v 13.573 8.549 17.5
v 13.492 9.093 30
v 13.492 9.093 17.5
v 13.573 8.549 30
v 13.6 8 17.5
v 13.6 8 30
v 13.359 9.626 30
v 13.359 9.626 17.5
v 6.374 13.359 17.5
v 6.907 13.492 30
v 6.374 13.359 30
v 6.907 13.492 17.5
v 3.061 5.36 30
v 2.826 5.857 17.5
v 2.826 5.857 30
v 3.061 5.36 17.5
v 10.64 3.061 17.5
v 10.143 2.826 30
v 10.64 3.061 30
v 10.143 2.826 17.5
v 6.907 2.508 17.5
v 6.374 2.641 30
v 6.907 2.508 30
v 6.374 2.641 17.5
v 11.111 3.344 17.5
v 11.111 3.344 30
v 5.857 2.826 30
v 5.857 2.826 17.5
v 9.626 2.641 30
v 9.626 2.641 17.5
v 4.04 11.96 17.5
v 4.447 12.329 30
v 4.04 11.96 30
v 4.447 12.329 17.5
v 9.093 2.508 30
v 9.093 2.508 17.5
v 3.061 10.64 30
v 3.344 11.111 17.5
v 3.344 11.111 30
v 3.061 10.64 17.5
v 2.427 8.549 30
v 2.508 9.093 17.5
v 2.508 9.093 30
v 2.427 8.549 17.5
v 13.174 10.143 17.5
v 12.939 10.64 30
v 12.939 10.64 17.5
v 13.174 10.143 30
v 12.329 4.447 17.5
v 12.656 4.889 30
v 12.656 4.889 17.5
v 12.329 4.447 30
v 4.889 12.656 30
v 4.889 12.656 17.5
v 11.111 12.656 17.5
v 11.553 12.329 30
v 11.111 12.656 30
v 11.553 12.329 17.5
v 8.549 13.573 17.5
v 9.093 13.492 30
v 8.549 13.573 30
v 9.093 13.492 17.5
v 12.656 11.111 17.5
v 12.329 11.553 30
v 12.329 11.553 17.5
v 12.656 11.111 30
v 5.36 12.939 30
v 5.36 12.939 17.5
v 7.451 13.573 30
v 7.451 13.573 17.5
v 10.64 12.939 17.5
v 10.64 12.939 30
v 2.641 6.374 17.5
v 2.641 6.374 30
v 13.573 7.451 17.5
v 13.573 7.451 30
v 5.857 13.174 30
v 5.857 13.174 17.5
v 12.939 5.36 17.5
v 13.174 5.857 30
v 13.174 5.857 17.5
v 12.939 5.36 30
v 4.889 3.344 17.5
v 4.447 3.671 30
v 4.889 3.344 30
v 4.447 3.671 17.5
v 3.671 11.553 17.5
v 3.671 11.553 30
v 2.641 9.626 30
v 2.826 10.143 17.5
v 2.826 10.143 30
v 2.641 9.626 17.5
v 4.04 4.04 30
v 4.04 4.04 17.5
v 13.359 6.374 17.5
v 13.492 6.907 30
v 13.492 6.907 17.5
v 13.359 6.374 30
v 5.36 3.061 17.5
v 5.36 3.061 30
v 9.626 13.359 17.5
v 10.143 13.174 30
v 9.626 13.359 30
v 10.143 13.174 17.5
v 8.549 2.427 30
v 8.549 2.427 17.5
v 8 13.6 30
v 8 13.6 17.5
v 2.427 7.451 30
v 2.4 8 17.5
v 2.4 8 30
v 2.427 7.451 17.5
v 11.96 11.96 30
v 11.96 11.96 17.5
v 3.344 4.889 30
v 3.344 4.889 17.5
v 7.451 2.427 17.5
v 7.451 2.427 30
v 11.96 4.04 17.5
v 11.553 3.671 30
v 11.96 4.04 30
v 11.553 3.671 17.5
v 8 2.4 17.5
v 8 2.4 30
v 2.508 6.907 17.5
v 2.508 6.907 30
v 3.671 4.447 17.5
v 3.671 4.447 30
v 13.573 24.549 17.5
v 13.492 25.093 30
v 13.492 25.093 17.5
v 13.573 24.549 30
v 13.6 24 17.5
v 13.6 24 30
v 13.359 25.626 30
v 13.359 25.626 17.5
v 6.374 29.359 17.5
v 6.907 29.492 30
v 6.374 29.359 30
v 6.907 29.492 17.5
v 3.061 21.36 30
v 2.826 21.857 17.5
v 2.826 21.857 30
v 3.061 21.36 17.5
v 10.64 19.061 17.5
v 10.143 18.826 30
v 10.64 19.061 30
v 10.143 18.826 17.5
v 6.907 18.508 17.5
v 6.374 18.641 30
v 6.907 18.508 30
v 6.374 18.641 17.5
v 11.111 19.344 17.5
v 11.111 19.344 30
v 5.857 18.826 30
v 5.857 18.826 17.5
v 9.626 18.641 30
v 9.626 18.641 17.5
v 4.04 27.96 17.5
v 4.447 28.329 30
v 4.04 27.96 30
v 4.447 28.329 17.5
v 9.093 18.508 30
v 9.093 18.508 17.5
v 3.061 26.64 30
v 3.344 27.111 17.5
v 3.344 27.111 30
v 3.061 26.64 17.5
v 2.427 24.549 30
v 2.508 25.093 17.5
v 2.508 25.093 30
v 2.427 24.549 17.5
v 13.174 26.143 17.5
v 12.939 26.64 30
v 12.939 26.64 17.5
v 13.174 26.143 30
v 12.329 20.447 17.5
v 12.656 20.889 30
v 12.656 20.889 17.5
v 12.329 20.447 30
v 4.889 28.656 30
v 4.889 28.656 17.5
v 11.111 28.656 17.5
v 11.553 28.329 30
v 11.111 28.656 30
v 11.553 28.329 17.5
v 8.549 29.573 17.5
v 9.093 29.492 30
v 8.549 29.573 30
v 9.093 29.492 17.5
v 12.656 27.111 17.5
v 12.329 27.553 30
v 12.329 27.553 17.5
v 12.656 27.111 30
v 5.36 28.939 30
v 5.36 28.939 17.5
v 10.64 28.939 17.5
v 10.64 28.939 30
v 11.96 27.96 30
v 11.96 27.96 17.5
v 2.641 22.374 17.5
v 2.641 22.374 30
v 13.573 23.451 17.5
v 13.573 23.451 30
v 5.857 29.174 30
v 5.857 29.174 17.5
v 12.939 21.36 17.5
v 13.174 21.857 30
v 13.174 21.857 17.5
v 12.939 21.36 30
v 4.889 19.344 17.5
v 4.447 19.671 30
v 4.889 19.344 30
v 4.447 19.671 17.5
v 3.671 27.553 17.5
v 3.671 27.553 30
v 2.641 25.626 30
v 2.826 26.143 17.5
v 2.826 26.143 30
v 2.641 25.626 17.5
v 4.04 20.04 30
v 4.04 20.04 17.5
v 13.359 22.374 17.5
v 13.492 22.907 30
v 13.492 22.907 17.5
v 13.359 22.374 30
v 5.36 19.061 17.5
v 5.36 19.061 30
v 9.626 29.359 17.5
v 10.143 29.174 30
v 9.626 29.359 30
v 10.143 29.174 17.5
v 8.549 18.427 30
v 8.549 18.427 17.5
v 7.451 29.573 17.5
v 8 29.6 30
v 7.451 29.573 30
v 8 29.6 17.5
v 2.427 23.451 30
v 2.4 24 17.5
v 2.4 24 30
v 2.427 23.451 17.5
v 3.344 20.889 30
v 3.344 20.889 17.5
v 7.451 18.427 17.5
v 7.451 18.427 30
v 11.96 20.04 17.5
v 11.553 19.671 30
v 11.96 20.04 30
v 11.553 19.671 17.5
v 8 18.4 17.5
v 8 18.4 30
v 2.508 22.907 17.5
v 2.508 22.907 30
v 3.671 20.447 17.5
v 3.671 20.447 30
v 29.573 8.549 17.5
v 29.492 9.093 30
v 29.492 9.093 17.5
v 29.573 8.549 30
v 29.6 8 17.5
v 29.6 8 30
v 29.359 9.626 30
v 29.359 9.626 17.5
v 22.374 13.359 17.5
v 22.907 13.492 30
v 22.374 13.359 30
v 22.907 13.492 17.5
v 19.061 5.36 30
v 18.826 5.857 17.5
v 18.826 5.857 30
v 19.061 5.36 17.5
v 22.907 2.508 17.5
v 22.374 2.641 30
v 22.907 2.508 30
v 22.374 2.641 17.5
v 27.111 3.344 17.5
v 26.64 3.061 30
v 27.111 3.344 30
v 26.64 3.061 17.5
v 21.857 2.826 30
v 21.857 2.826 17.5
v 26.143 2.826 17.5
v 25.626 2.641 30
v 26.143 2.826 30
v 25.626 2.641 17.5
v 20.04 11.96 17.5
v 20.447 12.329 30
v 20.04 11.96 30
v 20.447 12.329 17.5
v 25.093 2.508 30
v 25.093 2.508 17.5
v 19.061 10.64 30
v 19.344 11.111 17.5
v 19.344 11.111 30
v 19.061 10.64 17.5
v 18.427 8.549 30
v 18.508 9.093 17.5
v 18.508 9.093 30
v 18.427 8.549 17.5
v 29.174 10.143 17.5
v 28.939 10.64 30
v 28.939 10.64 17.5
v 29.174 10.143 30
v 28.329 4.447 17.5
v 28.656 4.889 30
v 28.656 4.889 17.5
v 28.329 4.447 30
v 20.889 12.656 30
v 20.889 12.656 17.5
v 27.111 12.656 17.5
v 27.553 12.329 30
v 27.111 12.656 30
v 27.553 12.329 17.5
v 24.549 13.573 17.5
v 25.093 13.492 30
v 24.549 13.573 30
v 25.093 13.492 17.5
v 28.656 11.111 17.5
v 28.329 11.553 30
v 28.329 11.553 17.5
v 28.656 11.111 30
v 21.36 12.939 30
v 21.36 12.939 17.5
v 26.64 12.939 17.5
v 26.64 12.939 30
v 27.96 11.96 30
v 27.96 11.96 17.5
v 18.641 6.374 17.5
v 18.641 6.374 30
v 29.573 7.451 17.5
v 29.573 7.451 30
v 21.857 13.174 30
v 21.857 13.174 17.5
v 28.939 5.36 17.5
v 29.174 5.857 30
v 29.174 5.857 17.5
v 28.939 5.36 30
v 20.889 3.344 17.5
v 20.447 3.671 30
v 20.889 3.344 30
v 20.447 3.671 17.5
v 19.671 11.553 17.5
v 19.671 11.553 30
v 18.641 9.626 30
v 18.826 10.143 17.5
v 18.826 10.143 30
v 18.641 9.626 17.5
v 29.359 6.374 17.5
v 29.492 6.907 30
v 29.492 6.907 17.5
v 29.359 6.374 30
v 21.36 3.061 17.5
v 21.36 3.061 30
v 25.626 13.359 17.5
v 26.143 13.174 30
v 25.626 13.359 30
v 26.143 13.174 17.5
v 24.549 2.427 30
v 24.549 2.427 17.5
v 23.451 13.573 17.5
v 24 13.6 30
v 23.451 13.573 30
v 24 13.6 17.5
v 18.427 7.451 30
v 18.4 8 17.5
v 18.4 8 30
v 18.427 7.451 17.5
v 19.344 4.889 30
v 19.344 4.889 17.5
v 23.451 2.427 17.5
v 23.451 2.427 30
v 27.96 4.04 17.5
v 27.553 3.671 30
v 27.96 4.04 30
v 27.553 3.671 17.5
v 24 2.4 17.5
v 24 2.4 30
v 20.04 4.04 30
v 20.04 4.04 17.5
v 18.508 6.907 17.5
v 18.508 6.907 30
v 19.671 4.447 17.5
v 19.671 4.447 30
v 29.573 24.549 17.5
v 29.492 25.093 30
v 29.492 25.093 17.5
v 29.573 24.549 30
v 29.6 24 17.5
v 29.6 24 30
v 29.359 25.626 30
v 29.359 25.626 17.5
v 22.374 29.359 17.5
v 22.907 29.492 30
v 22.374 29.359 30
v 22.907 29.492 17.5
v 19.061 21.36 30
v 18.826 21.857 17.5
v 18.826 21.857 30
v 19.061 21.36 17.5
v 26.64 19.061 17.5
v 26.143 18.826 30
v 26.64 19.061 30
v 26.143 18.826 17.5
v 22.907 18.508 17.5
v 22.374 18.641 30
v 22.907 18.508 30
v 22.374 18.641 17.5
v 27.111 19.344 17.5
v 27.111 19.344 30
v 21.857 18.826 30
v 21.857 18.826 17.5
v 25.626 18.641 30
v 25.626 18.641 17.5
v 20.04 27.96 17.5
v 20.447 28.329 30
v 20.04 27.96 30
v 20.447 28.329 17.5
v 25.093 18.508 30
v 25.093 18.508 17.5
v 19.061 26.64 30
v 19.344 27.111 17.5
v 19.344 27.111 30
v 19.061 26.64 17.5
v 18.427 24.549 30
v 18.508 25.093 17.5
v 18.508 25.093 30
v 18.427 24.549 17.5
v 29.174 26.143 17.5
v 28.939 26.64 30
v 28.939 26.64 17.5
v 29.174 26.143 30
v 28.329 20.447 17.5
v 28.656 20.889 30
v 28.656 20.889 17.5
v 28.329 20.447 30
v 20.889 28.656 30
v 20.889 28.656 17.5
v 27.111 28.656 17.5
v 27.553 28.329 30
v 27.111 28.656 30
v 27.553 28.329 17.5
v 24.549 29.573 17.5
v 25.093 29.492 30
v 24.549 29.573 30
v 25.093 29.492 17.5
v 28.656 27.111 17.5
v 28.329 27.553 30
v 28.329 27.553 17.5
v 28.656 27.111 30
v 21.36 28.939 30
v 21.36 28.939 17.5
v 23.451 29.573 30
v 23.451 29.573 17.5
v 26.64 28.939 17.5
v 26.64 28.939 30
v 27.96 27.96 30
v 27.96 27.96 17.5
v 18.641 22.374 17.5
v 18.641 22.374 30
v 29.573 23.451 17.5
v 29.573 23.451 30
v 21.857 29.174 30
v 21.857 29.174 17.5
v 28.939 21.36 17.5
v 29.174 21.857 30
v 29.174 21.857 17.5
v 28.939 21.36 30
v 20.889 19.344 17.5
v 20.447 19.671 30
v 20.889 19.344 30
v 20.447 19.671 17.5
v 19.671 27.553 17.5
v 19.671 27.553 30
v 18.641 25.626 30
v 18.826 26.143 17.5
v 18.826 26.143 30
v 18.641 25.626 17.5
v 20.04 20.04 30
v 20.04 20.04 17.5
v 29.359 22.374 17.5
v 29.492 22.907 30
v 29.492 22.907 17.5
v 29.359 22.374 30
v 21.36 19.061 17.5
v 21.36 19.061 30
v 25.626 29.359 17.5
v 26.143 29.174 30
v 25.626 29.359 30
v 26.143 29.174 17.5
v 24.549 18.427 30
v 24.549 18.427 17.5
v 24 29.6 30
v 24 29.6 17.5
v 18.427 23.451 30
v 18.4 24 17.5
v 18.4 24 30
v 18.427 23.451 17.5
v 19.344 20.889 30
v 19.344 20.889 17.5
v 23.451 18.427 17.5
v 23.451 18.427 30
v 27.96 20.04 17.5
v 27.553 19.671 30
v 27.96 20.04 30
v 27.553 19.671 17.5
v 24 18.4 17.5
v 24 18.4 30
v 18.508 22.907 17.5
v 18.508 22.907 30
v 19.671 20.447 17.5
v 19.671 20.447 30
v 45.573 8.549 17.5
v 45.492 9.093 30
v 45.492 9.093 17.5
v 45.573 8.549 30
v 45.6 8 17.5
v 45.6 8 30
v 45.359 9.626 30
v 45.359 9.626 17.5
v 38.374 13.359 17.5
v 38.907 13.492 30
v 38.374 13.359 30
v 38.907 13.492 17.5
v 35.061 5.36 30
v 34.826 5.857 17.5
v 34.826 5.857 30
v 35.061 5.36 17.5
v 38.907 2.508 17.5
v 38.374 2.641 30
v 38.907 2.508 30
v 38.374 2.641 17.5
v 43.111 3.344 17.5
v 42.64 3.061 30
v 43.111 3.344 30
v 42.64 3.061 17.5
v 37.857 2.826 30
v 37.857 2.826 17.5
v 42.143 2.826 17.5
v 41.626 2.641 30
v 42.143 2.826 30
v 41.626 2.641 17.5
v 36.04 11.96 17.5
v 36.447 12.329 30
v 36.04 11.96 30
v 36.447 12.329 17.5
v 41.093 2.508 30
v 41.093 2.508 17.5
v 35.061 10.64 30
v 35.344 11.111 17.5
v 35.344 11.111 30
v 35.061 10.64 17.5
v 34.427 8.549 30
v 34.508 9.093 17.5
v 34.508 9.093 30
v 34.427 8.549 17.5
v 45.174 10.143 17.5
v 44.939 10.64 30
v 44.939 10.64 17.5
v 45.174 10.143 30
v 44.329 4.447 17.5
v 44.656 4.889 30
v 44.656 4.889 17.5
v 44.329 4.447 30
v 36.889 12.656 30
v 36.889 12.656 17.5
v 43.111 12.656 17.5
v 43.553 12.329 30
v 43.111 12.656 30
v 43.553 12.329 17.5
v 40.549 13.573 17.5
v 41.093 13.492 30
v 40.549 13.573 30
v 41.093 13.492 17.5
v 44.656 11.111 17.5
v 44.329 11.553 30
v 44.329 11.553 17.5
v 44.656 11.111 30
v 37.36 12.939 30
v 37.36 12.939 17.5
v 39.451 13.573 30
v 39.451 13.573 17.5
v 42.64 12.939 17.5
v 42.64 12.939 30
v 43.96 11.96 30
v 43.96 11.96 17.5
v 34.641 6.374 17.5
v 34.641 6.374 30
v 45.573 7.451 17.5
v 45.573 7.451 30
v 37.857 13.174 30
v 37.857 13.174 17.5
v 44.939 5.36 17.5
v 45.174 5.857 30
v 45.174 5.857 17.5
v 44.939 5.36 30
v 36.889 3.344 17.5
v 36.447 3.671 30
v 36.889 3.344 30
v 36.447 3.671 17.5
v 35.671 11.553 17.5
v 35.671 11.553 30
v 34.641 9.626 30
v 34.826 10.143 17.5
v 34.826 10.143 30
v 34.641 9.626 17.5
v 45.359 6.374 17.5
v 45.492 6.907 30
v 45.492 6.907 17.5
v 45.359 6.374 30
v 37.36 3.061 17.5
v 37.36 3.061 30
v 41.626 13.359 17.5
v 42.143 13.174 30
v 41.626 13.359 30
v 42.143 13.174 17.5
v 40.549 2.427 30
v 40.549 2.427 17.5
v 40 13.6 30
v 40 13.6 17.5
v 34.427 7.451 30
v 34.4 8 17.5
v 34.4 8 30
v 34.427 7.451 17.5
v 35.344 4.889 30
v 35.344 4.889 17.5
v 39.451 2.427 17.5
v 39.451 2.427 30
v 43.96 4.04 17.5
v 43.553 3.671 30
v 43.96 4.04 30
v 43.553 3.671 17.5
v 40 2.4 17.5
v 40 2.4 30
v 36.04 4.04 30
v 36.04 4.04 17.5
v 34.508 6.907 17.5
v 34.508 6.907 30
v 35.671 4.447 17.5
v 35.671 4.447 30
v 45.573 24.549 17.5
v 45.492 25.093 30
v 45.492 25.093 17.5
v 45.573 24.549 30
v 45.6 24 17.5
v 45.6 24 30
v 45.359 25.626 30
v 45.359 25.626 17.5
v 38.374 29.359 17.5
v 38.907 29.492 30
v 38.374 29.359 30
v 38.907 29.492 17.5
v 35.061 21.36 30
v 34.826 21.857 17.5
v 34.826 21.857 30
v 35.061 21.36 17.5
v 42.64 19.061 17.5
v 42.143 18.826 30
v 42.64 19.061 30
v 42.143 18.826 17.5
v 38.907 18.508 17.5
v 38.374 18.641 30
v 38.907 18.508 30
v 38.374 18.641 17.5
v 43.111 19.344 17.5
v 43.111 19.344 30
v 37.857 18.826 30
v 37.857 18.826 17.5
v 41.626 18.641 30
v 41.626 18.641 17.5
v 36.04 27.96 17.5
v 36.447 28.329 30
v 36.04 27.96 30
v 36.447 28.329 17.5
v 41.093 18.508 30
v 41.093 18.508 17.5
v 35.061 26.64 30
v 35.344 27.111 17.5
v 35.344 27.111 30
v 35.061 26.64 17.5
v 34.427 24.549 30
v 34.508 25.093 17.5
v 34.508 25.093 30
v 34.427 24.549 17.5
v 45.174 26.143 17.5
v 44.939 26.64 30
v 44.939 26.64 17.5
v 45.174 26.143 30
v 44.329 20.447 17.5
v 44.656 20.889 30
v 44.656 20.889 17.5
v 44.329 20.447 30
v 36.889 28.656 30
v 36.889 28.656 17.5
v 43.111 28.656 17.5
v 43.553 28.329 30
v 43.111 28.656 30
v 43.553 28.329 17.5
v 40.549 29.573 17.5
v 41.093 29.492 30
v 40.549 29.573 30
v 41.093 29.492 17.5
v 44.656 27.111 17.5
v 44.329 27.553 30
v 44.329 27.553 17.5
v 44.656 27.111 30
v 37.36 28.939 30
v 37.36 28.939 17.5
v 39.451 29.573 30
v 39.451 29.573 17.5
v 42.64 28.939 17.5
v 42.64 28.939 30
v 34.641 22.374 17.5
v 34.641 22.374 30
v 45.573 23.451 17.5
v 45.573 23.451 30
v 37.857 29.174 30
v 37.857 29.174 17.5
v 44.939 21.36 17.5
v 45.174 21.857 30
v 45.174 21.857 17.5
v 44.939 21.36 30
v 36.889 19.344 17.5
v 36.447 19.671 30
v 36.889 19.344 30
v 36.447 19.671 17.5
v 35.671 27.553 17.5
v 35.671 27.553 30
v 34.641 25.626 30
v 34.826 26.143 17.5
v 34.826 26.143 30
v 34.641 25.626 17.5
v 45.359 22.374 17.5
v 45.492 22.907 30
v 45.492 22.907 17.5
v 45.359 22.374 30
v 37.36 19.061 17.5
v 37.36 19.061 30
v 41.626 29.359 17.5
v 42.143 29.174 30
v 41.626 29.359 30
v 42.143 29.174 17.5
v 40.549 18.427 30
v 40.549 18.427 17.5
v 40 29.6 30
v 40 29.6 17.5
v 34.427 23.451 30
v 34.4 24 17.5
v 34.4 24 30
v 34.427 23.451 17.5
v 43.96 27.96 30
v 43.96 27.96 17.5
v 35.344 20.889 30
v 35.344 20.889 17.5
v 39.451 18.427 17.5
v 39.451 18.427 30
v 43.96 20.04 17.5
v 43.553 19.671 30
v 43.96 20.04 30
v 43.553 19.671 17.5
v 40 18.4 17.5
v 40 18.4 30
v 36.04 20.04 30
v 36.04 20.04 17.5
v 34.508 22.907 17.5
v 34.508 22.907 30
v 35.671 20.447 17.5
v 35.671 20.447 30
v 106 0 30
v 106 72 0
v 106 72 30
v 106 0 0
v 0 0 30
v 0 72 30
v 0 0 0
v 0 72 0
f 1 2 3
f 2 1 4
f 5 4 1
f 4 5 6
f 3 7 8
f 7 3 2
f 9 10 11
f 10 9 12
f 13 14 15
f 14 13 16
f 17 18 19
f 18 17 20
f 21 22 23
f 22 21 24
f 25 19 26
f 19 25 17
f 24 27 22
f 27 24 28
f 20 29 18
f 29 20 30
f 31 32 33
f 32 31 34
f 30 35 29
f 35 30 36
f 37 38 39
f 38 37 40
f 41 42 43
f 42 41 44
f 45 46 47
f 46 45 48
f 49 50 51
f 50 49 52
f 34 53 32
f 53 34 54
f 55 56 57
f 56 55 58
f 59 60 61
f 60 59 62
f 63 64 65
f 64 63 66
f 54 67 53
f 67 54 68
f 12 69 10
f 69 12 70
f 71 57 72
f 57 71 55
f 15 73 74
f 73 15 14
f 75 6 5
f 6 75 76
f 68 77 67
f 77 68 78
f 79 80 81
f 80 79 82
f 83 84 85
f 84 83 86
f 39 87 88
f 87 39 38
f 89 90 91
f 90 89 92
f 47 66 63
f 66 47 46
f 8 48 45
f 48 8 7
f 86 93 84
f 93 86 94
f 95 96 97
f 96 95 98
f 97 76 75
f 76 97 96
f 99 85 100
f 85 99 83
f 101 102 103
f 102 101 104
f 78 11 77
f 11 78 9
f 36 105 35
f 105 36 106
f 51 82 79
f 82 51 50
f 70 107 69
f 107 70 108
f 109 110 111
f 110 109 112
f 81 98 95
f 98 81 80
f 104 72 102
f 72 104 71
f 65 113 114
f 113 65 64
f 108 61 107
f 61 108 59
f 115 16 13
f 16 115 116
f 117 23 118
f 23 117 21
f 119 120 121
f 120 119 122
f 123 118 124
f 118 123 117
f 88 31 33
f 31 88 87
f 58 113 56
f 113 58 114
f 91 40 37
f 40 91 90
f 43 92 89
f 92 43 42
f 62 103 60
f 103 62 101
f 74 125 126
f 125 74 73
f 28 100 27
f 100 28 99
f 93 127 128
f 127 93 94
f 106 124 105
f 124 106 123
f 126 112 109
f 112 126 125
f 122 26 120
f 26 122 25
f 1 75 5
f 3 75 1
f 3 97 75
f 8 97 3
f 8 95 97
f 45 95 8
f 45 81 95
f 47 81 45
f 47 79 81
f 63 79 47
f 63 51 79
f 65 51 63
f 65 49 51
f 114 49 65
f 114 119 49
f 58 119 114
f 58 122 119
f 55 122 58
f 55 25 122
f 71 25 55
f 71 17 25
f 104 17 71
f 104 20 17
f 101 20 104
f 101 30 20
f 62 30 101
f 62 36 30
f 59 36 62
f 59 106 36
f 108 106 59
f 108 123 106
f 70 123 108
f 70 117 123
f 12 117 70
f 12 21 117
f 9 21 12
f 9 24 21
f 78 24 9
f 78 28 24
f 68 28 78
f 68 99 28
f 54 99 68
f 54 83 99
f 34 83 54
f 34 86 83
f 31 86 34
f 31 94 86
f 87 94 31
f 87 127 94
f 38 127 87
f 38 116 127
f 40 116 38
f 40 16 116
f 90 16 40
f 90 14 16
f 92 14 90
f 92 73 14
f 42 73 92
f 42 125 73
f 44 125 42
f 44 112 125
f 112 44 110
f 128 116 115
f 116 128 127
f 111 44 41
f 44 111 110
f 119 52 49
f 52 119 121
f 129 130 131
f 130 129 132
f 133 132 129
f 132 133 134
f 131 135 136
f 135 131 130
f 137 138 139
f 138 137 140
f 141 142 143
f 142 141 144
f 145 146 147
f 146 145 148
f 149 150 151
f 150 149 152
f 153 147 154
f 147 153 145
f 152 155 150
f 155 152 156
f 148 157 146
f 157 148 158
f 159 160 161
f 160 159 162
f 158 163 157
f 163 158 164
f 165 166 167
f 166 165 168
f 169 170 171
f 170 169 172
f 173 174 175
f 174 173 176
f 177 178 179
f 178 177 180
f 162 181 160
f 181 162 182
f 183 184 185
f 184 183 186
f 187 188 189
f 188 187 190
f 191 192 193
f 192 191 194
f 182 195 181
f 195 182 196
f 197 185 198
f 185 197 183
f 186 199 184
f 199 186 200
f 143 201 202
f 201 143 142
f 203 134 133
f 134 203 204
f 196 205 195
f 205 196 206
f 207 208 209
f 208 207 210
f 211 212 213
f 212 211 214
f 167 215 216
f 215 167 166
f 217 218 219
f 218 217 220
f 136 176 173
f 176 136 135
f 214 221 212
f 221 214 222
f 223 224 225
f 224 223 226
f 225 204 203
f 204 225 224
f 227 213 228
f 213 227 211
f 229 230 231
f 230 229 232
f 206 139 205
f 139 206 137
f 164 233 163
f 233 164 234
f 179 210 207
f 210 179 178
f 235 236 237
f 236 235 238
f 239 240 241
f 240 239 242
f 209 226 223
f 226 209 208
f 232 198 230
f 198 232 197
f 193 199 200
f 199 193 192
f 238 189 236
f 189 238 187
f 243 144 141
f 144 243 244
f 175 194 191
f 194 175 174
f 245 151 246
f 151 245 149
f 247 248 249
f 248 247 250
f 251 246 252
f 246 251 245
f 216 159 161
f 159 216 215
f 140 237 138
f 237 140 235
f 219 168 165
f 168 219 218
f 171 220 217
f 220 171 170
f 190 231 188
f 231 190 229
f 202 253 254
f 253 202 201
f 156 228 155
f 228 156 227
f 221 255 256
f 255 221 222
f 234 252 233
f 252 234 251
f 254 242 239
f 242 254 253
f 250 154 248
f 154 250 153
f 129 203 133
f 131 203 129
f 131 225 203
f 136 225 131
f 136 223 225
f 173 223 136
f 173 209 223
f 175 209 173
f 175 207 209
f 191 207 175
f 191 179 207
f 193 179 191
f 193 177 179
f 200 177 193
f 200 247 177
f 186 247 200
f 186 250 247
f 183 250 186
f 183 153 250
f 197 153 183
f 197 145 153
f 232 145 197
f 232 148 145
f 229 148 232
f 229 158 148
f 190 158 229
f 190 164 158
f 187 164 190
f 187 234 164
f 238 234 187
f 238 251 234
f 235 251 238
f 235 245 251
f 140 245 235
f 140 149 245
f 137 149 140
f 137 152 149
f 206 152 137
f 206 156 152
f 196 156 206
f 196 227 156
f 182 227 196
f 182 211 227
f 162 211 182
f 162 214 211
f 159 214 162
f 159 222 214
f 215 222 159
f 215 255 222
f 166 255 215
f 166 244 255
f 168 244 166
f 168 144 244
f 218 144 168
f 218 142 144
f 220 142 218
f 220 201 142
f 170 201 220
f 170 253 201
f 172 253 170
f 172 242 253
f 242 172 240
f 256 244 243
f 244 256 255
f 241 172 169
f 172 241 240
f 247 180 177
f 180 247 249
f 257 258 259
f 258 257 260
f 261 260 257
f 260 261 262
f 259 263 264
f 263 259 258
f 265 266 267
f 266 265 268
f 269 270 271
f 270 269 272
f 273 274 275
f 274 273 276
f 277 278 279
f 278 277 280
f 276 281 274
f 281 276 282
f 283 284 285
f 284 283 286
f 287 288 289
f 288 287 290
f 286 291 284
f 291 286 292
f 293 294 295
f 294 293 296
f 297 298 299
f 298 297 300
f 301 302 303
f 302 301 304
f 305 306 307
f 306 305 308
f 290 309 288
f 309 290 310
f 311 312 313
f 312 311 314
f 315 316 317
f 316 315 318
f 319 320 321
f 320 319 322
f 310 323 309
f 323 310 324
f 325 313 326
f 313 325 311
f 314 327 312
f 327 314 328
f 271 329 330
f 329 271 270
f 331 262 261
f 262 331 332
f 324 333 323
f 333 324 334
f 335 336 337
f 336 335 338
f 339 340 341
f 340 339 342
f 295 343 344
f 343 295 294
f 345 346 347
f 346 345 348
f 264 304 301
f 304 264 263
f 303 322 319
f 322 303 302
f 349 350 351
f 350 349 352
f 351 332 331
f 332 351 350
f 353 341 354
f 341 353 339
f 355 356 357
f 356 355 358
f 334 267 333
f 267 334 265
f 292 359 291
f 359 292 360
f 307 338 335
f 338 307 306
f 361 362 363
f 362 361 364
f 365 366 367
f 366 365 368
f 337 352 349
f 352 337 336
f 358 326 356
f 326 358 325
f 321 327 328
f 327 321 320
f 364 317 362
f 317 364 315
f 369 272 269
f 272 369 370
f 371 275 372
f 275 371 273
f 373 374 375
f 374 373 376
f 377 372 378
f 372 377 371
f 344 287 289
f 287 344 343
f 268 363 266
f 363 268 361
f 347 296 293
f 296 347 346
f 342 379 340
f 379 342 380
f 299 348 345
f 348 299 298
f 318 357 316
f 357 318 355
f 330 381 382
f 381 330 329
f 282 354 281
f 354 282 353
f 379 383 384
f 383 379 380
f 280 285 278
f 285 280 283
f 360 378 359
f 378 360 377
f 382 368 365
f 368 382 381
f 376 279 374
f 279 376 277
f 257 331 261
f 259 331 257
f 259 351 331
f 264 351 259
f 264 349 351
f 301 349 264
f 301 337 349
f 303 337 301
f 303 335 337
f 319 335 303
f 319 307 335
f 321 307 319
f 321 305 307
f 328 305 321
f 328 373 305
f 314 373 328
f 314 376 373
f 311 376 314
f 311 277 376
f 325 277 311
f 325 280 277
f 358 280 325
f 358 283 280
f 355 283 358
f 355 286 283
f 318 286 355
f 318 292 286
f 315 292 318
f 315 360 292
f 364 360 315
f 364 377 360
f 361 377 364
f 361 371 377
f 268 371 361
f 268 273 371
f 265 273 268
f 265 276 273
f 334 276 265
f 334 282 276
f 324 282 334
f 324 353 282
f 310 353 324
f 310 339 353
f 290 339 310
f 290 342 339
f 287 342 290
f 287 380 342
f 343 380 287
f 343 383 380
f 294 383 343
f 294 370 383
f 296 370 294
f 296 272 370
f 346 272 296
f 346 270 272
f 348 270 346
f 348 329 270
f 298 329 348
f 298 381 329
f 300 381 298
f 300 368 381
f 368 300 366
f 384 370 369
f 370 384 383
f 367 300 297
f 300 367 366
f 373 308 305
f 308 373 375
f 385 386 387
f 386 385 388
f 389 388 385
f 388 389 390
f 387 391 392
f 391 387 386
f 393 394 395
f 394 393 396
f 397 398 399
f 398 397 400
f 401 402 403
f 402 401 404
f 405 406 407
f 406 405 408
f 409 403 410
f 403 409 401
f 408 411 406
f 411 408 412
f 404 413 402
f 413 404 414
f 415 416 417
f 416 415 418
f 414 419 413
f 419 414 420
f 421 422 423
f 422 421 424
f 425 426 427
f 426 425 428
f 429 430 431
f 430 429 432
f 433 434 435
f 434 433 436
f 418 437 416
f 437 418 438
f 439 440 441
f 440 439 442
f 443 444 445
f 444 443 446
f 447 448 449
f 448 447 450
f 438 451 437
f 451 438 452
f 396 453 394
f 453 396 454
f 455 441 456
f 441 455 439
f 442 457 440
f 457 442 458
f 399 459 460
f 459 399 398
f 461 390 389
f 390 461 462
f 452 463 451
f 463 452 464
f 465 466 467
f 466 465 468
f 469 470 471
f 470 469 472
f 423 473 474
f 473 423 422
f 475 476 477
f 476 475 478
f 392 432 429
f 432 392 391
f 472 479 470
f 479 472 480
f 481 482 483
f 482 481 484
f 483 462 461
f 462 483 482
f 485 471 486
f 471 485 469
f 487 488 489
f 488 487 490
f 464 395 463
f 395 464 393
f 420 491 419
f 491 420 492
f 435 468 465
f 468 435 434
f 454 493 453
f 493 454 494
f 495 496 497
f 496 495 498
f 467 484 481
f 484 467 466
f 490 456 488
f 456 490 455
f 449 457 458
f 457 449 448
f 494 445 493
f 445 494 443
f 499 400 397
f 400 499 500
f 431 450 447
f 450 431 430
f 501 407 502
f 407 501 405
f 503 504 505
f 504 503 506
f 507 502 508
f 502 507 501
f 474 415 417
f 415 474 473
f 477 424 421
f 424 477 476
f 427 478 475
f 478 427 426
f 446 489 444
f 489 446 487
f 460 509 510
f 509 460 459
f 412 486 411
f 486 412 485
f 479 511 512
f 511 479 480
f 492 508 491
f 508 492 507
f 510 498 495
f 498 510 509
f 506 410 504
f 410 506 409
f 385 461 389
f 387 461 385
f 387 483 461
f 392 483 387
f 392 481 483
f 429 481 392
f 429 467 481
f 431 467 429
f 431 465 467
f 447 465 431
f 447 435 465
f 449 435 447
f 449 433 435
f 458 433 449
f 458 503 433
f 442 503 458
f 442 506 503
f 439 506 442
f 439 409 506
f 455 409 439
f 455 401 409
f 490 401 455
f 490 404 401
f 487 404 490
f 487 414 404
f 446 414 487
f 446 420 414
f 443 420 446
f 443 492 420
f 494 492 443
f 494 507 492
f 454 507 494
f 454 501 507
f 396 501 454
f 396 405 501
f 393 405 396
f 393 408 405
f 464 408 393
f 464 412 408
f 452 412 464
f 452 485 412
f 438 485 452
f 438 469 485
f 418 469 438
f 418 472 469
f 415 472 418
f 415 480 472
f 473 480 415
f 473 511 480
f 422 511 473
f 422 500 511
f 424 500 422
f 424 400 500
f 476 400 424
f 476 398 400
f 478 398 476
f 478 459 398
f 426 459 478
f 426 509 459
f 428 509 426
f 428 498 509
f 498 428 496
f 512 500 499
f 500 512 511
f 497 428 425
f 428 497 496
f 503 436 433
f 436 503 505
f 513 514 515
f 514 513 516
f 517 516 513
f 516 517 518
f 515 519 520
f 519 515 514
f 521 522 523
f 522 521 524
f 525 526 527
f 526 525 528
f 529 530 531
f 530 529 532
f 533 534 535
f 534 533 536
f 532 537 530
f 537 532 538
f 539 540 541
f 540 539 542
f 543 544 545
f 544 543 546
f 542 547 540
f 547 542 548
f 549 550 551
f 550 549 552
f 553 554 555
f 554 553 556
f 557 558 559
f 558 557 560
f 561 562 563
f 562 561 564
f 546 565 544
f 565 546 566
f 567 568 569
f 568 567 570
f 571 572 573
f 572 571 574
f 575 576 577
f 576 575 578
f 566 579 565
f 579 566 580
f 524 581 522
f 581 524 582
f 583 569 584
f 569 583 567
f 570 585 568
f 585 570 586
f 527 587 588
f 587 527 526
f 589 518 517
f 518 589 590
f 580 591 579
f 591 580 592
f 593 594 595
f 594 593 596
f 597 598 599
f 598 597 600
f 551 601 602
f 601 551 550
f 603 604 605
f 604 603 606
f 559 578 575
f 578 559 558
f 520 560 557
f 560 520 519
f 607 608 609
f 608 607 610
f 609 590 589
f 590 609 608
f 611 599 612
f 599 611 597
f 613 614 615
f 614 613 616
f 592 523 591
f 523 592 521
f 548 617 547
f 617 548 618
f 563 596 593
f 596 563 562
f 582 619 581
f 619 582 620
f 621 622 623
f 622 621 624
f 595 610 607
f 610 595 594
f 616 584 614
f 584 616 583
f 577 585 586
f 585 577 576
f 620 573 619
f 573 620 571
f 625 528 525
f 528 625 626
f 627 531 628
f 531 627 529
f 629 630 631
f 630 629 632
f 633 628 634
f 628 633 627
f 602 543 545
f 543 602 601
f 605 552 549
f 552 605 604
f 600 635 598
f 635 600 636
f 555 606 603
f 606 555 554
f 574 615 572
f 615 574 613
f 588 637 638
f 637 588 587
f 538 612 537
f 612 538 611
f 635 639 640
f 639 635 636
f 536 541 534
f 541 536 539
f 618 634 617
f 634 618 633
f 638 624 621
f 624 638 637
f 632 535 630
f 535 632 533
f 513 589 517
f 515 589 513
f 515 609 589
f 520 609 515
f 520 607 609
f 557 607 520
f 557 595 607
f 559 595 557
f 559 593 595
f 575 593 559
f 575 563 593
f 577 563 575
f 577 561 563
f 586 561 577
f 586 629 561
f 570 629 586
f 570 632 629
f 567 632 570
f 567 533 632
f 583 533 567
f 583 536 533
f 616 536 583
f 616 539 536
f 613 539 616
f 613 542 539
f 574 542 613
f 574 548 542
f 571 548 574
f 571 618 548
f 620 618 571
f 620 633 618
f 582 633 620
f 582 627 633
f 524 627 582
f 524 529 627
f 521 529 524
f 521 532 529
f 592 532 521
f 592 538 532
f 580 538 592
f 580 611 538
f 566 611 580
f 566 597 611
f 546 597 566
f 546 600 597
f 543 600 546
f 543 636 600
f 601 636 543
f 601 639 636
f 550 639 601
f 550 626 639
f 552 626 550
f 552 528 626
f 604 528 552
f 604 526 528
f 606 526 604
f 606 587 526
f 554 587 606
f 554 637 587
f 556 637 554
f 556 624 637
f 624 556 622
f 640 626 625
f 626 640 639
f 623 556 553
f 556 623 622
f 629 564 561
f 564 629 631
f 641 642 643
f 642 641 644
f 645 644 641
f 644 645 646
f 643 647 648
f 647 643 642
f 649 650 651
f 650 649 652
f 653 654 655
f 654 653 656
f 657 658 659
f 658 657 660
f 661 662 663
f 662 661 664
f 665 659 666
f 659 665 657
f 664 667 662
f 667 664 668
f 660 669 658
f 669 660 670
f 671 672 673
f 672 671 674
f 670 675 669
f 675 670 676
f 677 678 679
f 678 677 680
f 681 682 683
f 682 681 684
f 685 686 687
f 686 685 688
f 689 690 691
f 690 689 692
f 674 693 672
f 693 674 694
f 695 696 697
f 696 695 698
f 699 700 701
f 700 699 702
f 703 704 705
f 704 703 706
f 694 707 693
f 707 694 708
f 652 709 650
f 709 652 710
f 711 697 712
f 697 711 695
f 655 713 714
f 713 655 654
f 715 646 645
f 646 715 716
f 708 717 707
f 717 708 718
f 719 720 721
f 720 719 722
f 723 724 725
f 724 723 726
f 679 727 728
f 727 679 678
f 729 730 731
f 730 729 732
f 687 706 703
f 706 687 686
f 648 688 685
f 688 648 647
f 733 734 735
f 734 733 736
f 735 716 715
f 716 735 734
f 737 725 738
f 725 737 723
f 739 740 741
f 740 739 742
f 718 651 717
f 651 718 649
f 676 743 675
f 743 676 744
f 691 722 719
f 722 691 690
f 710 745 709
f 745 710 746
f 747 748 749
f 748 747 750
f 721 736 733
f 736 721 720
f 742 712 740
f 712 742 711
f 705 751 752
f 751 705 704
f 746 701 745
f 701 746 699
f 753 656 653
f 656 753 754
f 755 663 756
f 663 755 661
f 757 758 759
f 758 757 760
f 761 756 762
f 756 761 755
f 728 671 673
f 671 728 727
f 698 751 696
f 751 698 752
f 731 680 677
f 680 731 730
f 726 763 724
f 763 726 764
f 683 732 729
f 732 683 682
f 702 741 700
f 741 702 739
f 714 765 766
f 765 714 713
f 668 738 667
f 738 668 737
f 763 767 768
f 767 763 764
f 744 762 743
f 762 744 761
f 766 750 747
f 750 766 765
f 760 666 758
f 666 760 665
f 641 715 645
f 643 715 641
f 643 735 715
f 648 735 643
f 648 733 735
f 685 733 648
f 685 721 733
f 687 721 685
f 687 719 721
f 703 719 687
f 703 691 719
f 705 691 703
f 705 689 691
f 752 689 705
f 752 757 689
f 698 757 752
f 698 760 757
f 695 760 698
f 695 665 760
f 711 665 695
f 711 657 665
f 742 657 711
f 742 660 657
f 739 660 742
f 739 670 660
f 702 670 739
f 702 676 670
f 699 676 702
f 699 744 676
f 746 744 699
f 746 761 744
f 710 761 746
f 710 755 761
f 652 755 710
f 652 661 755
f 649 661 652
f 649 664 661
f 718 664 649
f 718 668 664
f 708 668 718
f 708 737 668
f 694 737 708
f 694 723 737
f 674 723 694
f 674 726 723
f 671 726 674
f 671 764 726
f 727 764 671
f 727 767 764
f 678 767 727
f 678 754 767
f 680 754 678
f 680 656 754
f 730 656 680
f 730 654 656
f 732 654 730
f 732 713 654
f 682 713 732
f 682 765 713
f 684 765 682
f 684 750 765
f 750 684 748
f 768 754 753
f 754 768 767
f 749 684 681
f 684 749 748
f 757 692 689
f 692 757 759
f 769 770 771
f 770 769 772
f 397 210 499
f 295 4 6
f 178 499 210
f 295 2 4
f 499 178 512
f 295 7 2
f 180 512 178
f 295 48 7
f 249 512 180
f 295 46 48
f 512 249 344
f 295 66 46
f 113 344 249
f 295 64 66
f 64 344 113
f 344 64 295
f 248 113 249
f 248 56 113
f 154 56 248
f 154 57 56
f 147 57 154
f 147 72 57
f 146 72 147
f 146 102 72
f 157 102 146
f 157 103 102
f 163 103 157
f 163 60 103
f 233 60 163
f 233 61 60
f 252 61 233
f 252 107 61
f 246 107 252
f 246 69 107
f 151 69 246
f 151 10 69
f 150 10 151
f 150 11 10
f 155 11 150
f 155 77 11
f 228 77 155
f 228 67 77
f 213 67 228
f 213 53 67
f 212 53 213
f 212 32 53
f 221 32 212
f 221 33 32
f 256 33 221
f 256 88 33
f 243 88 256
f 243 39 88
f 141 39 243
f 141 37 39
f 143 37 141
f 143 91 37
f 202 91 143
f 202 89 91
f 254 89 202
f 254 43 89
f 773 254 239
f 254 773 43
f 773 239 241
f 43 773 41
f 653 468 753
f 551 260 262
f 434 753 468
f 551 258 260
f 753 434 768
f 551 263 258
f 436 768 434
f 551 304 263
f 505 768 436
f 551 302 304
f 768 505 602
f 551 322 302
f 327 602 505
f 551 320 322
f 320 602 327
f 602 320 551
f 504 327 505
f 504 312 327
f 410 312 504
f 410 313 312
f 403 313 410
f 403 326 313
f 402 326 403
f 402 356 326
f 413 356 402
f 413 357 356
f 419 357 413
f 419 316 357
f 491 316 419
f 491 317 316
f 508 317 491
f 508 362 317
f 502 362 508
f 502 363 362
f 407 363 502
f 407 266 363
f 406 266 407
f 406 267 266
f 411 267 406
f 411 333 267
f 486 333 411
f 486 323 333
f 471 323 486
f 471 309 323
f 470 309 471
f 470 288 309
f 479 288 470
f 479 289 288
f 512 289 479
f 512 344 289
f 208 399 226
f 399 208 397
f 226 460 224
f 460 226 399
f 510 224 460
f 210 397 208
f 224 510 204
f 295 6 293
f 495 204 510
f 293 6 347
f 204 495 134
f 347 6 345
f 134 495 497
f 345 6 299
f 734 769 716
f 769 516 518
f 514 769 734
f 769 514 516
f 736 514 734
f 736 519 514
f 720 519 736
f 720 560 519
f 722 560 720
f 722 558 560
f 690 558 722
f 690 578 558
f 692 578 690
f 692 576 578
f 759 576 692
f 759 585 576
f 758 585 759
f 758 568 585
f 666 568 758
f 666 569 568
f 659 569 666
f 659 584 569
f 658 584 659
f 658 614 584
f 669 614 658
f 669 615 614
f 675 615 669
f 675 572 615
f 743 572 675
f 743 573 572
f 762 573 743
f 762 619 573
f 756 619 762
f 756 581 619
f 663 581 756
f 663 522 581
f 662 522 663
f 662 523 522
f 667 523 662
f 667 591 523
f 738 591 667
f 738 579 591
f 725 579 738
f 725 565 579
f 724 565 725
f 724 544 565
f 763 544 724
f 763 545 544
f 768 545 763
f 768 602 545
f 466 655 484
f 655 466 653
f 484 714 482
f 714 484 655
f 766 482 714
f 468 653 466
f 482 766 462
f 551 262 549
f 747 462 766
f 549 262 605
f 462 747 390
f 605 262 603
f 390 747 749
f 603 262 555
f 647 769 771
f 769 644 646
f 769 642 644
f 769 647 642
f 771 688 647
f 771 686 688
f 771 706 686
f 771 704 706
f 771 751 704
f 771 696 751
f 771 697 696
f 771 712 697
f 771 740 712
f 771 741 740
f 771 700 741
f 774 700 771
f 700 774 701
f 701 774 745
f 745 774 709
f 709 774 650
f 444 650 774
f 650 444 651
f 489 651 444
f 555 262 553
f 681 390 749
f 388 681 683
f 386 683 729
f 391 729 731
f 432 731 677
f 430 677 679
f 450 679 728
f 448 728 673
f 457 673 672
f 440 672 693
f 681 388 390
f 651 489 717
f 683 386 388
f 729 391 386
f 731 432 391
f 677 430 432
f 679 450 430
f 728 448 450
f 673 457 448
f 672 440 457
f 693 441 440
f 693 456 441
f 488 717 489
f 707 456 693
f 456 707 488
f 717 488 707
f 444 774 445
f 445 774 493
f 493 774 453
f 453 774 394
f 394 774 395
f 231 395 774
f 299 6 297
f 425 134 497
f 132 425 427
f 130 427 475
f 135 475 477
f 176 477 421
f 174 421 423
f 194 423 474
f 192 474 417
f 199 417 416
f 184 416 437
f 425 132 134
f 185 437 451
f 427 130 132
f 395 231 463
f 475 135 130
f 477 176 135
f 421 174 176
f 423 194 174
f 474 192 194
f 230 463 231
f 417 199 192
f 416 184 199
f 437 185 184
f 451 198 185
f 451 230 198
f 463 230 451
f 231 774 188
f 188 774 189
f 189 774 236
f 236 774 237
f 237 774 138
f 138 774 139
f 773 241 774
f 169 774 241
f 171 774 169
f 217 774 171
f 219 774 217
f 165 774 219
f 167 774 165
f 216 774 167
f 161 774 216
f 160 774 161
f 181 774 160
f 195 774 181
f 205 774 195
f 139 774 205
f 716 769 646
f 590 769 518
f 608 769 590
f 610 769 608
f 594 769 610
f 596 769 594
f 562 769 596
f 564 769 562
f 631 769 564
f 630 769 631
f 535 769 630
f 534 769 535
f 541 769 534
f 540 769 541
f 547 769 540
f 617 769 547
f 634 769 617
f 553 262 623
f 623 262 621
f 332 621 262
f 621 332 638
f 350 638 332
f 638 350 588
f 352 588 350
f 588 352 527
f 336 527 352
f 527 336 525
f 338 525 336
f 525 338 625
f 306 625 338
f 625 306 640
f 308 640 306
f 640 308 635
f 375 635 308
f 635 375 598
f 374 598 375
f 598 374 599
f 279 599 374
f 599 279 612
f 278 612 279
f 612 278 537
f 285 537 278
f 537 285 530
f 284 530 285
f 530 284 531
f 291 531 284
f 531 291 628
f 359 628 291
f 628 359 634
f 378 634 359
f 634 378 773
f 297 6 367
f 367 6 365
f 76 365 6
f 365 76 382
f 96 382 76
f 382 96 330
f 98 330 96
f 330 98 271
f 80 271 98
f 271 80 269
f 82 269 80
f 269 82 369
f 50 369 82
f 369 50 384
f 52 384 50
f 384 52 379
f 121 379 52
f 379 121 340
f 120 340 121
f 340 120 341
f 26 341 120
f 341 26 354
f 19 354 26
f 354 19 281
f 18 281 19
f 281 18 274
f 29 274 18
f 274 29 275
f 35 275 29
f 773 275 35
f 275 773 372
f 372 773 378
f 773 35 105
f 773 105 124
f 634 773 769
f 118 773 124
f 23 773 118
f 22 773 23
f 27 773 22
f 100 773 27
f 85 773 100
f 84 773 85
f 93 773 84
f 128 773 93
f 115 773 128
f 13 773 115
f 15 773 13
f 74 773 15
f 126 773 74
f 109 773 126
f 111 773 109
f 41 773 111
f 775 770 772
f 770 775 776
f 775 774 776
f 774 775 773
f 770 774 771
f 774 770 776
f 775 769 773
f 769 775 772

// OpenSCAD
// Bench Rack for 1.5 mL Microcentrifuge Tubes
// Designed for FDM 3D printing.
// Units: Millimetres (mm)

// --- Dimensions ---
block_length = 106;  // X dimension (mm)
block_width = 72;    // Y dimension (mm)
block_height = 30;   // Z dimension (mm)

hole_rows = 4;       // Number of rows along Y
hole_cols = 6;       // Number of columns along X
hole_pitch_x = 16;   // Centre-to-centre spacing X (mm)
hole_pitch_y = 16;   // Centre-to-centre spacing Y (mm)

hole_diameter = 11.2; // Hole diameter (mm)
hole_depth = 25;     // Hole depth (mm)
floor_thickness = 5; // Solid floor thickness (mm)

// --- Printing & Geometry Parameters ---
$fn = 64;            // Facet count for curved shapes

// Extension for difference() to avoid coplanar faces
cut_extension = 0.1; // mm

// --- Derived Variables ---
// Grid centering offsets
grid_x_offset = (block_length - (hole_cols - 1) * hole_pitch_x) / 2;
grid_y_offset = (block_width - (hole_rows - 1) * hole_pitch_y) / 2;

// Hole center Z calculation
// Top of hole at block_height, bottom at block_height - hole_depth
// To satisfy cut_extension rule:
// Top cut extends to block_height + cut_extension
// Bottom cut extends to (block_height - hole_depth) - cut_extension
hole_height = hole_depth + (2 * cut_extension);
hole_center_z = (block_height + cut_extension) - (hole_height / 2);

// --- Module Definition ---
module bench_rack() {
    difference() {
        // 1. Main Block
        // Centered on origin, resting on Z=0
        translate([0, 0, 0])
            cube([block_length, block_width, block_height]);

        // 2. Holes
        // Loop over columns (X) and rows (Y)
        for (x = [0 : hole_cols - 1]) {
            for (y = [0 : hole_rows - 1]) {
                // Calculate position for this hole
                pos_x = (x * hole_pitch_x) - ((hole_cols - 1) * hole_pitch_x) / 2;
                pos_y = (y * hole_pitch_y) - ((hole_rows - 1) * hole_pitch_y) / 2;

                // Translate to hole position
                // Cylinder is centered at origin, so we translate to the center of the hole
                // The cylinder height is calculated to extend past the faces
                translate([pos_x, pos_y, hole_center_z])
                    cylinder(
                        h = hole_height,
                        r = hole_diameter / 2,
                        $fn = 64
                    );
            }
        }
    }
}

// --- Main Execution ---
bench_rack();
